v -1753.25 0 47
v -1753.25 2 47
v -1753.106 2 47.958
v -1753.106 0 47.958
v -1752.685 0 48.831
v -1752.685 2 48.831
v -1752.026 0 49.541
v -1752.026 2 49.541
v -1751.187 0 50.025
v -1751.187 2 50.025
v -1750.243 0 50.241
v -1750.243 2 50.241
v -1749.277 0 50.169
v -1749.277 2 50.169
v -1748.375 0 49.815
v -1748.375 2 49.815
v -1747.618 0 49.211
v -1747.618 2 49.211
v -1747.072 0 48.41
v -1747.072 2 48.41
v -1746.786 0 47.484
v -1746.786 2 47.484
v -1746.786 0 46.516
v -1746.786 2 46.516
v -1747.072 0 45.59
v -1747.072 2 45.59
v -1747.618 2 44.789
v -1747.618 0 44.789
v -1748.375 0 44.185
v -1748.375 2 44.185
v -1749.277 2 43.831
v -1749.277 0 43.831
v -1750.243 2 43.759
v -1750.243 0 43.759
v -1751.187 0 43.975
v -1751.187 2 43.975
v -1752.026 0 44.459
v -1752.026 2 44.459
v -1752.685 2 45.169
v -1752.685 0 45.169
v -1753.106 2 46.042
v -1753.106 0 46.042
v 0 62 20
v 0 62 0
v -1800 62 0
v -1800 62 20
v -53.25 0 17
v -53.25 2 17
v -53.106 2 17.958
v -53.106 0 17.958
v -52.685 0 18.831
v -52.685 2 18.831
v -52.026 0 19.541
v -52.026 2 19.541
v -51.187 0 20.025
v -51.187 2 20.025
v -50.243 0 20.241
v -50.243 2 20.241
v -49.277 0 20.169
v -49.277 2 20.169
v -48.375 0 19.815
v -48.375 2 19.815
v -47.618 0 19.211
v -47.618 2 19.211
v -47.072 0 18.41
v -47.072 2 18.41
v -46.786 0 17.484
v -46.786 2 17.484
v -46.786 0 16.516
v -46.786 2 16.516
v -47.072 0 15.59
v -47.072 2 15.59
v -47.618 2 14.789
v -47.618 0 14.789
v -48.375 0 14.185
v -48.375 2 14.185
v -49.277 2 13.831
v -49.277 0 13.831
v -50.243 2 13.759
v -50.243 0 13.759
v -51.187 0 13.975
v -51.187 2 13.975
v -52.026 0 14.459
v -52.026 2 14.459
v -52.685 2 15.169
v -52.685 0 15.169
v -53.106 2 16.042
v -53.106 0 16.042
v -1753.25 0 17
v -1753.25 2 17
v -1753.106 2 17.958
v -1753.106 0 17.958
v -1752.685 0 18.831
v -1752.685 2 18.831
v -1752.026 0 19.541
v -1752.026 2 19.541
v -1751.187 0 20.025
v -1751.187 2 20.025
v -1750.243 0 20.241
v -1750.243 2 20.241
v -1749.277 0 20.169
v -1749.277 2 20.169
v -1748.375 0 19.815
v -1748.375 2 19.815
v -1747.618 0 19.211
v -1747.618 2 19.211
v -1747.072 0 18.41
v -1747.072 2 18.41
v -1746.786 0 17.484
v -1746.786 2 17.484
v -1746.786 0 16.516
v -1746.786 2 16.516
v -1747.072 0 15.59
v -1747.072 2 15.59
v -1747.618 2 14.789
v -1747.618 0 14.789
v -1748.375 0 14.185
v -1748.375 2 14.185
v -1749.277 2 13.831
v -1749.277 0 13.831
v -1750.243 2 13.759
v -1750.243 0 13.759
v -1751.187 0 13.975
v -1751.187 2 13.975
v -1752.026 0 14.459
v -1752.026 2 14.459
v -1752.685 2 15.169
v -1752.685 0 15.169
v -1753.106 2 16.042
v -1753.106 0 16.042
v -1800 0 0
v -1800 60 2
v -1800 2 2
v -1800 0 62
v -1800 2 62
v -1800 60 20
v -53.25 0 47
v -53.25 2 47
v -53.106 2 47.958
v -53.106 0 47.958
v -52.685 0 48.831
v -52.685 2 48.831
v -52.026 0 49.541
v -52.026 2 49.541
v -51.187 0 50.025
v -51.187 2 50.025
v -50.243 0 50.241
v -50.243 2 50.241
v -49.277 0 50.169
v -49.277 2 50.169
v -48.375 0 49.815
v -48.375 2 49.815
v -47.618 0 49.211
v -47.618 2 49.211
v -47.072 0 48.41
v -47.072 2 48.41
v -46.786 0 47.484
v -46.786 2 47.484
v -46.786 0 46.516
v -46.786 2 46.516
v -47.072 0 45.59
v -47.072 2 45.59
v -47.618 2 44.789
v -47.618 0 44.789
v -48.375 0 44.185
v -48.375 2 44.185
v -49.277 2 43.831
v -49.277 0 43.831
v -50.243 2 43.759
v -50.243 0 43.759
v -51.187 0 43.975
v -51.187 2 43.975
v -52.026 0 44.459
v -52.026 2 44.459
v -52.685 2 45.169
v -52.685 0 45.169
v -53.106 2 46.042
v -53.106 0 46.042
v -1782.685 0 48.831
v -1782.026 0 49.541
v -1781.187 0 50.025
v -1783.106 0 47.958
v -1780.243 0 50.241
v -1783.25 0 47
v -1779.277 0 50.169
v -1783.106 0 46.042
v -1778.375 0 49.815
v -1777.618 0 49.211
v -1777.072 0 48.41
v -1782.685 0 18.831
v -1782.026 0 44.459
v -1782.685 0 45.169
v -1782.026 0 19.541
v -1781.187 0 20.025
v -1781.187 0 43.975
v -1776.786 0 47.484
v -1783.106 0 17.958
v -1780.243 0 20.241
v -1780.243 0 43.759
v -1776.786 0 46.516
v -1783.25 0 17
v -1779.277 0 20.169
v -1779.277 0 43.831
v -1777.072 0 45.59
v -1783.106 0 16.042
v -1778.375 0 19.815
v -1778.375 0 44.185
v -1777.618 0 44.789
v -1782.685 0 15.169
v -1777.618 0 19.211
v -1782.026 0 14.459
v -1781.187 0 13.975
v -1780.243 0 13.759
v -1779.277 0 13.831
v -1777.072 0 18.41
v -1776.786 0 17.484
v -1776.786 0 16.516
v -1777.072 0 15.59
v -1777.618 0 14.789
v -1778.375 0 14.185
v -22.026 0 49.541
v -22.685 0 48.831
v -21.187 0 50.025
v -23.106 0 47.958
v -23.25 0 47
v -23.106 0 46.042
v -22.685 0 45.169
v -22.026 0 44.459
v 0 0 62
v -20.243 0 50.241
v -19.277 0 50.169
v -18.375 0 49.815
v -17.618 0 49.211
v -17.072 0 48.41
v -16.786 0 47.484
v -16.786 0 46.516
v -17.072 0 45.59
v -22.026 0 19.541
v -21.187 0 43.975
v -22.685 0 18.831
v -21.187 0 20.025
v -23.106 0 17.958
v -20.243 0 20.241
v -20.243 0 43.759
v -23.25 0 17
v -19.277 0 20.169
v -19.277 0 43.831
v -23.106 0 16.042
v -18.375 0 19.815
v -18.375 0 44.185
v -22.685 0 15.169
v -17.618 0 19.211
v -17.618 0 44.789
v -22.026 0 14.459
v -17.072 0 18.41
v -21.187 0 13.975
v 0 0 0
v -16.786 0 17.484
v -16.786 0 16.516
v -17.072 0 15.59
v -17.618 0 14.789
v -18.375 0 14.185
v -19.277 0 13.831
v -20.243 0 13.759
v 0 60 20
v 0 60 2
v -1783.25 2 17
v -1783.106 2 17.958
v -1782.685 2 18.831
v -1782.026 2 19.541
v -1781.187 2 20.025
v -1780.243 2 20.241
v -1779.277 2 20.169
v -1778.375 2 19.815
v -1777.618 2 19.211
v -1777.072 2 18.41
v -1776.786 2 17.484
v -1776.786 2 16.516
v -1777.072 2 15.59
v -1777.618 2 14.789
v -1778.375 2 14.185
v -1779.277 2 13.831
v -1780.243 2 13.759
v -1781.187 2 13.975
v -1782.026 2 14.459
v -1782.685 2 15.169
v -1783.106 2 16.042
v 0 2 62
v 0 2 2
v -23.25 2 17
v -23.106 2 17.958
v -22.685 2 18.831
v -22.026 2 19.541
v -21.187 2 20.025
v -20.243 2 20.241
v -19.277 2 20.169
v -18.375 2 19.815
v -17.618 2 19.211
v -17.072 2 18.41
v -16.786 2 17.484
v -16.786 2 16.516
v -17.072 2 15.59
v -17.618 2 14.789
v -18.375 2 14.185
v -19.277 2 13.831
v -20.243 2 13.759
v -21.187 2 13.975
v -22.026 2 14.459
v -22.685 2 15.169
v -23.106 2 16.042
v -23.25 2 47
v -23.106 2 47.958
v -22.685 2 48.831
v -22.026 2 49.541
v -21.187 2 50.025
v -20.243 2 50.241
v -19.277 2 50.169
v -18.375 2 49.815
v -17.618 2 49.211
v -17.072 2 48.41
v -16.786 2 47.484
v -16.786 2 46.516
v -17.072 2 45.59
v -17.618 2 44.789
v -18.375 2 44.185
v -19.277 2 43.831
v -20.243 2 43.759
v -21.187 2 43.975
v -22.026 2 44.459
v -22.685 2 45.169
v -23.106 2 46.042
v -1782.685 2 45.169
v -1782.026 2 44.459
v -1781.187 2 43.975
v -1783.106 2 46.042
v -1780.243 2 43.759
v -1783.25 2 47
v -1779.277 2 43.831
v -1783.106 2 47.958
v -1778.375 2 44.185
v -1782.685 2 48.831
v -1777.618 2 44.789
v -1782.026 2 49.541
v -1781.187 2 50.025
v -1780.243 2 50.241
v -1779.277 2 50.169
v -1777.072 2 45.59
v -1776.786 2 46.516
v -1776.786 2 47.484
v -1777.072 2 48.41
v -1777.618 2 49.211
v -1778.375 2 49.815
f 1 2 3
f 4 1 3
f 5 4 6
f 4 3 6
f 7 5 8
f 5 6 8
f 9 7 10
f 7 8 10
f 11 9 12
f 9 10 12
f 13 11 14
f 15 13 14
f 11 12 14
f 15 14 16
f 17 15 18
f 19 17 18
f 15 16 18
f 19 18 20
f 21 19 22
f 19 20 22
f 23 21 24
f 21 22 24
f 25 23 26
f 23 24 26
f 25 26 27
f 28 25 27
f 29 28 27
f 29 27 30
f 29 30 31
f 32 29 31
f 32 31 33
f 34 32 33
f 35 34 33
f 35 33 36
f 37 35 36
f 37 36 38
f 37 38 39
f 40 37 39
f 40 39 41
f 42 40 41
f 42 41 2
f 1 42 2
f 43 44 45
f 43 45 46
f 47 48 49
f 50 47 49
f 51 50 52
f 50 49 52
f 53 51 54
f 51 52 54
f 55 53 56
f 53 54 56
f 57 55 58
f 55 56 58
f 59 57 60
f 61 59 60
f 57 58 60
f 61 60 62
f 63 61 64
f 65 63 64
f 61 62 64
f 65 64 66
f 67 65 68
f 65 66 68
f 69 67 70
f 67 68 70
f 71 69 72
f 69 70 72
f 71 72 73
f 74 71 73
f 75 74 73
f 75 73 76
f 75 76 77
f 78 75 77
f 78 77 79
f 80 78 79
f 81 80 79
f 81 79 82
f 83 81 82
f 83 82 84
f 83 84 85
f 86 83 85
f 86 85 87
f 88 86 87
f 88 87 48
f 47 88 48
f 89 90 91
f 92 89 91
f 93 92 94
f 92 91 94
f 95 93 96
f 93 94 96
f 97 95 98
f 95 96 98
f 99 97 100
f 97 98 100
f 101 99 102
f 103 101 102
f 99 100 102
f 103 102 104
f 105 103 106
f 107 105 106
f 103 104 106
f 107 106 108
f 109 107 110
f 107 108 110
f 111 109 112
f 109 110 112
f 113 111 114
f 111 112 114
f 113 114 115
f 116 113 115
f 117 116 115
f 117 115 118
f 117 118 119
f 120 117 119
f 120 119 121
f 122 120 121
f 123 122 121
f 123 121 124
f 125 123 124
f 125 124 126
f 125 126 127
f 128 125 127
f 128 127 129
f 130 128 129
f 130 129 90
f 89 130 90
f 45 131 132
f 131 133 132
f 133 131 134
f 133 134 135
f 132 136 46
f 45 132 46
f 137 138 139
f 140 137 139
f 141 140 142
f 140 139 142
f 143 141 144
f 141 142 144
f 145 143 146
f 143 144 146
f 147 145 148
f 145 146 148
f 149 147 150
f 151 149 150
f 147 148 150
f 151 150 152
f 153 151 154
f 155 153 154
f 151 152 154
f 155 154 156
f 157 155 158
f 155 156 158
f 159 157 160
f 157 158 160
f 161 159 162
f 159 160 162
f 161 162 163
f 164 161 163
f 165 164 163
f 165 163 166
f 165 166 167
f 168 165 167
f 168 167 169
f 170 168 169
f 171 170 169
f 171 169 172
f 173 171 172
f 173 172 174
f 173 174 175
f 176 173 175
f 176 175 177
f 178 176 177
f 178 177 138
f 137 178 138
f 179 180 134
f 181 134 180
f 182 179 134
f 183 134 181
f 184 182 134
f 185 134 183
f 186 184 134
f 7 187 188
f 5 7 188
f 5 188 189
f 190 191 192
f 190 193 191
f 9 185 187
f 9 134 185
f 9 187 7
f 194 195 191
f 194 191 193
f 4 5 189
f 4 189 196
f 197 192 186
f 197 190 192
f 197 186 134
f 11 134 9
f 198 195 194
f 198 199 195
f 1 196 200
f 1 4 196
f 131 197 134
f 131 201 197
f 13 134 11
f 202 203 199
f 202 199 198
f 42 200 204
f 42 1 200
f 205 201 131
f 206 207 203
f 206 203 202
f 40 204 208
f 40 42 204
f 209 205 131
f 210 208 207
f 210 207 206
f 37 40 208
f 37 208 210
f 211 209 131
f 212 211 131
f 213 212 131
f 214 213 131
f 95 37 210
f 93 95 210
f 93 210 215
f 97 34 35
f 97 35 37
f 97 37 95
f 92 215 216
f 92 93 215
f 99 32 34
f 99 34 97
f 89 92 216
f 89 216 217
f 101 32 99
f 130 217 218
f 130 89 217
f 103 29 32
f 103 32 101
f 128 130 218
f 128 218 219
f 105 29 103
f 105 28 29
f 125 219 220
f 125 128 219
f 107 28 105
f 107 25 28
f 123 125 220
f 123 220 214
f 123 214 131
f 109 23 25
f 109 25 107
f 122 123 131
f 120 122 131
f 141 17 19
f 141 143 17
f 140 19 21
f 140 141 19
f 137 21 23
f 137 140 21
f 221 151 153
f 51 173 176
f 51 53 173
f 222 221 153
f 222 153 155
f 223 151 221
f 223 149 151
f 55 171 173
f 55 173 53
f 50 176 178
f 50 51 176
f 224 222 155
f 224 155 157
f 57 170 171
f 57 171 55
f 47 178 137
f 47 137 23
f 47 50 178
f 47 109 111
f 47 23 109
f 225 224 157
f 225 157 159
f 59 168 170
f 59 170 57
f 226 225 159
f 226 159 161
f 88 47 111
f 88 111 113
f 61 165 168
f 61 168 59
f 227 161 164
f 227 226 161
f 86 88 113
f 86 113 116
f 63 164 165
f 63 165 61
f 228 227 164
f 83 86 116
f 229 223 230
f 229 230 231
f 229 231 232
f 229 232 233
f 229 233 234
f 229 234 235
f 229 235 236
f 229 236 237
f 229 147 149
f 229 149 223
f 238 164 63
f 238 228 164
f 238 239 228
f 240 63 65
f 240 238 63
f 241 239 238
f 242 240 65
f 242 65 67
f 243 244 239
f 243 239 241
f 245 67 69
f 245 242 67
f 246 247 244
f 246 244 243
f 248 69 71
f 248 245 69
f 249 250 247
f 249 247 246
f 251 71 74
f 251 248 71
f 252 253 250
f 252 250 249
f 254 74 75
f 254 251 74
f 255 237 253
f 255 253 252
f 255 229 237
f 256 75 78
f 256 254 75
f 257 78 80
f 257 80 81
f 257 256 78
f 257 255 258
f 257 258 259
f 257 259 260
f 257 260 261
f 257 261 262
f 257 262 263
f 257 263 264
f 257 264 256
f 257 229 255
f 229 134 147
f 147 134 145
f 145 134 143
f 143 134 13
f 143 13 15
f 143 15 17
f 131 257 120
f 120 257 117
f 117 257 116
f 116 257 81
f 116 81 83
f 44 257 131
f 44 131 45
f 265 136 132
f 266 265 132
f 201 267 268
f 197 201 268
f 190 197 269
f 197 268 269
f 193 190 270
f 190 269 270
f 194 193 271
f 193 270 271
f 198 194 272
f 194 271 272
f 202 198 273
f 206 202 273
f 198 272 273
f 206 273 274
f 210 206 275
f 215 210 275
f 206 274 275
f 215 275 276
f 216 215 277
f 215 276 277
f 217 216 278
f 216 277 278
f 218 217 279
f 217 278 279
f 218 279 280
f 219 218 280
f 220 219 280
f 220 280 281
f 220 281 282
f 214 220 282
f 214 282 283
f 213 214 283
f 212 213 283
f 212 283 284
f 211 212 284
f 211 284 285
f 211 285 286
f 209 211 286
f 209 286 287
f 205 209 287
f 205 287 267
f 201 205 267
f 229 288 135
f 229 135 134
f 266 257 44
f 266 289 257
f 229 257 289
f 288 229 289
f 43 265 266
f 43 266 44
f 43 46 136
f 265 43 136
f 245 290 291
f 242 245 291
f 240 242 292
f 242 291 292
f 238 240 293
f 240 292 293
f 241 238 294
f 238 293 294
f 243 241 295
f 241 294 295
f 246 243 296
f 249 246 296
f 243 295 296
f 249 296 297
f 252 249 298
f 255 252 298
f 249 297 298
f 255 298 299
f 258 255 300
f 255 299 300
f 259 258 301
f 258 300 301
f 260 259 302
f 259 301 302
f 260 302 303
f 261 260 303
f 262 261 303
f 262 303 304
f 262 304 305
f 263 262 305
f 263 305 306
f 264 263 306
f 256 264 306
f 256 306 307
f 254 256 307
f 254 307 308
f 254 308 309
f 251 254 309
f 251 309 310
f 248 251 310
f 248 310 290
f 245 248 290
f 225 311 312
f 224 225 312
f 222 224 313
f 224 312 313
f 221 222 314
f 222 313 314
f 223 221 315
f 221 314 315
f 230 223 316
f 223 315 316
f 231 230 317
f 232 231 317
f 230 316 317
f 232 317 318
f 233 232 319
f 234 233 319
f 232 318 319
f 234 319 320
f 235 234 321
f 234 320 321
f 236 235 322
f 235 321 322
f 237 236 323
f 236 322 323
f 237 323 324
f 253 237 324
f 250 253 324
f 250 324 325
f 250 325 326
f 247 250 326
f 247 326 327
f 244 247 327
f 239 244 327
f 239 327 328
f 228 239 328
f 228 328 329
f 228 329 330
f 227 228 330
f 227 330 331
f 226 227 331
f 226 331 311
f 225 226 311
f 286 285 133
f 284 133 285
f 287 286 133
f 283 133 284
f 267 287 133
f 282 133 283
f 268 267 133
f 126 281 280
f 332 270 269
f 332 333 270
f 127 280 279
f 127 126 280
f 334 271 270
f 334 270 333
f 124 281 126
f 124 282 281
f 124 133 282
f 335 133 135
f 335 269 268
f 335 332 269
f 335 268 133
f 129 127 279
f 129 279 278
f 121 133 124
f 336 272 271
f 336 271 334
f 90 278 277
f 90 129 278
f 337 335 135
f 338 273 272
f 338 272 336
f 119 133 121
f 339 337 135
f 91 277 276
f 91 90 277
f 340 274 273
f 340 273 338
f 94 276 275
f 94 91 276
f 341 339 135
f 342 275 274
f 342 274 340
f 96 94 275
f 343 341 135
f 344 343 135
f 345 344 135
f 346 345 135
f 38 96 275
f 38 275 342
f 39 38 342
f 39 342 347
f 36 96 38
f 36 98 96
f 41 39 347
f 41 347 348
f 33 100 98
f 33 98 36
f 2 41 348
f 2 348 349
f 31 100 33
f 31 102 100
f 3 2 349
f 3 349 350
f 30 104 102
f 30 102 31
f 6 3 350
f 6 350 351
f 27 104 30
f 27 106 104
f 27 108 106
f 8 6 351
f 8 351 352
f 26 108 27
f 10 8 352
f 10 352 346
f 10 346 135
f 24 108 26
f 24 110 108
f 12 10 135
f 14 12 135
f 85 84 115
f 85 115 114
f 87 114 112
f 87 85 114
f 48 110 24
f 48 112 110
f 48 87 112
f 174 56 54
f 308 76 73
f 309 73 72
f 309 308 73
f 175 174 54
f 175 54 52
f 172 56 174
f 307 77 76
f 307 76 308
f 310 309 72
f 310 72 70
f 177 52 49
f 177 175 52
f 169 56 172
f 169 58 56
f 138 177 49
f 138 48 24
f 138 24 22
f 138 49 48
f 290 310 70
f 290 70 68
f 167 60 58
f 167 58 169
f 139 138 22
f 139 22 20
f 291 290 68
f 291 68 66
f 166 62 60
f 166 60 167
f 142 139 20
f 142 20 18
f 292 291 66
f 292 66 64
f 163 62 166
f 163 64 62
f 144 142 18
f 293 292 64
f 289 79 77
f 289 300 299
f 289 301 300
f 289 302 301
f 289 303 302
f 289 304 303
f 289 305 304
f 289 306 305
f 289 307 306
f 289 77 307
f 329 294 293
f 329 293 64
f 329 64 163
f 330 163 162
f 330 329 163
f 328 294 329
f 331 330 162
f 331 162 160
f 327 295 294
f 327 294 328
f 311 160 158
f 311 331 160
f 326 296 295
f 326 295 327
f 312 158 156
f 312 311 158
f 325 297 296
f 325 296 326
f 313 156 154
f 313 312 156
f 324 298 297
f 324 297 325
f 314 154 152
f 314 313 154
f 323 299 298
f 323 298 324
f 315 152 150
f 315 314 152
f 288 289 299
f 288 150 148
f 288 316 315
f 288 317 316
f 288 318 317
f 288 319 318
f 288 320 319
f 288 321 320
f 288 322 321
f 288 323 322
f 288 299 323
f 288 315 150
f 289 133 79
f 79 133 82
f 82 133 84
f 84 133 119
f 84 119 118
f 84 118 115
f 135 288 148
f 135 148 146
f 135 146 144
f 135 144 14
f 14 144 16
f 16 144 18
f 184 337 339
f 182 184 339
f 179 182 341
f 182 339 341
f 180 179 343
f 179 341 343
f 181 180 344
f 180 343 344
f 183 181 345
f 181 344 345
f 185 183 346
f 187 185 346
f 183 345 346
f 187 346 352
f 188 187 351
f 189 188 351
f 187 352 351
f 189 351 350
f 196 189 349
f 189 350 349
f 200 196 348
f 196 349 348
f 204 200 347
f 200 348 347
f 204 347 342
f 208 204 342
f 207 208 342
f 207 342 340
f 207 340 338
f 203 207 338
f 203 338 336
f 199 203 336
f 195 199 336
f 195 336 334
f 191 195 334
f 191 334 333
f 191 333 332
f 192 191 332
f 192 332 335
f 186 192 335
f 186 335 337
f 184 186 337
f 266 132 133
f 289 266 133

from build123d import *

# Parameters (mm, degrees)
F1_DEPTH = 1800
F2_R     = 3.25
F3_DEPTH = 25


with BuildPart() as f1:
    # F0 (on Right) → F1 (new body)
    with BuildSketch(Plane.YZ):
        Polygon((0, 62), (0, 0), (62, 0), (62, 20), (60, 20), (60, 2), (2, 2), (2, 62), align=None)
    extrude(amount=-F1_DEPTH)

    # F2 (on face) → F3 (cut)
    with BuildSketch(Plane(origin=(0, 2, 0), x_dir=(-1, 0, 0), z_dir=(0, 1, 0))):
        with Locations((20, 47)):
            Circle(F2_R)
        with Locations((50, 47)):
            Circle(F2_R)
        with Locations((20, 17)):
            Circle(F2_R)
        with Locations((50, 17)):
            Circle(F2_R)
        with Locations((1750, 47)):
            Circle(F2_R)
        with Locations((1780, 47)):
            Circle(F2_R)
        with Locations((1780, 17)):
            Circle(F2_R)
        with Locations((1750, 17)):
            Circle(F2_R)
    extrude(amount=-F3_DEPTH, mode=Mode.SUBTRACT)


solid = f1.part
